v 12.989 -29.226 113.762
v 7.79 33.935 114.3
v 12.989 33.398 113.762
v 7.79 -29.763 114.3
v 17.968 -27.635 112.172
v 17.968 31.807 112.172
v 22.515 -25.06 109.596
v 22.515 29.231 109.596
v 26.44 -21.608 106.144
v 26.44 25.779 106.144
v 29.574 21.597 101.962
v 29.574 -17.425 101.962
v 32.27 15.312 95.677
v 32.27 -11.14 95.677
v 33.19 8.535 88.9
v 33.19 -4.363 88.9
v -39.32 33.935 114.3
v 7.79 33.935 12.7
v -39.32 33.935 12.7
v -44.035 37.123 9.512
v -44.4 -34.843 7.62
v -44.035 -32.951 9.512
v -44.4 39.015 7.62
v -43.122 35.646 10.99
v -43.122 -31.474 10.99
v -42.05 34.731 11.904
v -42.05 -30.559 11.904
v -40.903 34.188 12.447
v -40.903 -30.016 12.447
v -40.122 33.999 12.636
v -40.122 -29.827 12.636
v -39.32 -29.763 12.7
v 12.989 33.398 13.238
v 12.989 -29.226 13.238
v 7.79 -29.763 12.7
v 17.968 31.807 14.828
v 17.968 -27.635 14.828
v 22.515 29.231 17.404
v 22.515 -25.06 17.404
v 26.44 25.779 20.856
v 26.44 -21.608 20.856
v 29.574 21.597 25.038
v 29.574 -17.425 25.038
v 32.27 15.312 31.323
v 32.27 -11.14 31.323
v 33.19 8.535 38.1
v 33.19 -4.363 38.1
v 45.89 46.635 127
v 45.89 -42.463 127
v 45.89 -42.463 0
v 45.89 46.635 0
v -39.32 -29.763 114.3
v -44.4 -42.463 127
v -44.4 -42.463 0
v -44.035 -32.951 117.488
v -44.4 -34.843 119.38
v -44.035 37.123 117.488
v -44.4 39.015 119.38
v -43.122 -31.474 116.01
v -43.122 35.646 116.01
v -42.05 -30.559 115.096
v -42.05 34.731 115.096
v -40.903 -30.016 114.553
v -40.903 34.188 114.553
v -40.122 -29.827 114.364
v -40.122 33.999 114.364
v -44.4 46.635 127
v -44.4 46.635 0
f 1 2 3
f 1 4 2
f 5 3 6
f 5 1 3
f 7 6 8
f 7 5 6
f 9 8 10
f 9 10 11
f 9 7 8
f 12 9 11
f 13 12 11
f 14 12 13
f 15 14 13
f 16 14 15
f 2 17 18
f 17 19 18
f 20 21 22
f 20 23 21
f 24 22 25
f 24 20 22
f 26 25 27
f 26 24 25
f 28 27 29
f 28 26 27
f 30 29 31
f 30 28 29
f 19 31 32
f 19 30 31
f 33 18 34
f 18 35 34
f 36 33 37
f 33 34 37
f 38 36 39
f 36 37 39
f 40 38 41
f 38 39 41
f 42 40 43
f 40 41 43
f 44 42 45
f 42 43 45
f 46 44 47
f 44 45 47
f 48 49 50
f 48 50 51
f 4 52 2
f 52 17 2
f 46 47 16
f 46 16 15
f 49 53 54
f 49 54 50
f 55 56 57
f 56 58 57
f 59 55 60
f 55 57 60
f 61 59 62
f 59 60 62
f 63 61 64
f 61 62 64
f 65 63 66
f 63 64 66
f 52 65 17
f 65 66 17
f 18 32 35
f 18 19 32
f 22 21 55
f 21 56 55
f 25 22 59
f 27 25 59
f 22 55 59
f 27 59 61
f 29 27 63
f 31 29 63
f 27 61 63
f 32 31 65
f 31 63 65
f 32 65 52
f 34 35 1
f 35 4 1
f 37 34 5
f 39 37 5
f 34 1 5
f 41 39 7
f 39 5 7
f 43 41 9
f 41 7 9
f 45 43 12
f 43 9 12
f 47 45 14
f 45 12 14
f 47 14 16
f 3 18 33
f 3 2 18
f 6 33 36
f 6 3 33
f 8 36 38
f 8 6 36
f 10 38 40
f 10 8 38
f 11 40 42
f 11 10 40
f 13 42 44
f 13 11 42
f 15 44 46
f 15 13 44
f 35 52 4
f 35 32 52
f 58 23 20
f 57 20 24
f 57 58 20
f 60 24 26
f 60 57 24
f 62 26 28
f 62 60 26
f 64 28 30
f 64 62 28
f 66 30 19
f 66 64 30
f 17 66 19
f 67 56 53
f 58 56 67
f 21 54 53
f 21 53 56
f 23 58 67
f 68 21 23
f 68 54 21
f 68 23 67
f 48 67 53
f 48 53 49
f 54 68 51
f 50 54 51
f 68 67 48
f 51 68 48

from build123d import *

# Parameters (mm, degrees)
F0_W     = 90.2906134725
F0_H     = 89.0986584127
F1_DEPTH = 127
F2_T     = -12.7
F3_R     = 5.08
F4_R     = 25.4


with BuildPart() as f1:
    # F0 (on Top) → F1 (new body)
    with BuildSketch(Plane.XY):
        with Locations((0.744972378, 2.0859222859)):
            Rectangle(F0_W, F0_H)
    extrude(amount=F1_DEPTH)

    # F2
    f2_openings = [f1.faces().sort_by_distance(p)[0] for p in [
        (-44.400334, 2.085922, 63.5),
    ]]
    offset(amount=F2_T, openings=f2_openings)

    # F3
    f3_edges = [f1.edges().sort_by_distance(p)[0] for p in [
        (-44.400334, -29.763407, 63.5),
        (-44.400334, 2.085922, 12.7),
        (-44.400334, 33.935251, 63.5),
        (-44.400334, 2.085922, 114.3),
    ]]
    fillet(f3_edges, radius=F3_R)

    # F4
    f4_edges = [f1.edges().sort_by_distance(p)[0] for p in [
        (33.190279, 2.085922, 12.7),
        (33.190279, 33.935251, 63.5),
        (33.190279, 2.085922, 114.3),
        (33.190279, -29.763407, 63.5),
    ]]
    fillet(f4_edges, radius=F4_R)


solid = f1.part
